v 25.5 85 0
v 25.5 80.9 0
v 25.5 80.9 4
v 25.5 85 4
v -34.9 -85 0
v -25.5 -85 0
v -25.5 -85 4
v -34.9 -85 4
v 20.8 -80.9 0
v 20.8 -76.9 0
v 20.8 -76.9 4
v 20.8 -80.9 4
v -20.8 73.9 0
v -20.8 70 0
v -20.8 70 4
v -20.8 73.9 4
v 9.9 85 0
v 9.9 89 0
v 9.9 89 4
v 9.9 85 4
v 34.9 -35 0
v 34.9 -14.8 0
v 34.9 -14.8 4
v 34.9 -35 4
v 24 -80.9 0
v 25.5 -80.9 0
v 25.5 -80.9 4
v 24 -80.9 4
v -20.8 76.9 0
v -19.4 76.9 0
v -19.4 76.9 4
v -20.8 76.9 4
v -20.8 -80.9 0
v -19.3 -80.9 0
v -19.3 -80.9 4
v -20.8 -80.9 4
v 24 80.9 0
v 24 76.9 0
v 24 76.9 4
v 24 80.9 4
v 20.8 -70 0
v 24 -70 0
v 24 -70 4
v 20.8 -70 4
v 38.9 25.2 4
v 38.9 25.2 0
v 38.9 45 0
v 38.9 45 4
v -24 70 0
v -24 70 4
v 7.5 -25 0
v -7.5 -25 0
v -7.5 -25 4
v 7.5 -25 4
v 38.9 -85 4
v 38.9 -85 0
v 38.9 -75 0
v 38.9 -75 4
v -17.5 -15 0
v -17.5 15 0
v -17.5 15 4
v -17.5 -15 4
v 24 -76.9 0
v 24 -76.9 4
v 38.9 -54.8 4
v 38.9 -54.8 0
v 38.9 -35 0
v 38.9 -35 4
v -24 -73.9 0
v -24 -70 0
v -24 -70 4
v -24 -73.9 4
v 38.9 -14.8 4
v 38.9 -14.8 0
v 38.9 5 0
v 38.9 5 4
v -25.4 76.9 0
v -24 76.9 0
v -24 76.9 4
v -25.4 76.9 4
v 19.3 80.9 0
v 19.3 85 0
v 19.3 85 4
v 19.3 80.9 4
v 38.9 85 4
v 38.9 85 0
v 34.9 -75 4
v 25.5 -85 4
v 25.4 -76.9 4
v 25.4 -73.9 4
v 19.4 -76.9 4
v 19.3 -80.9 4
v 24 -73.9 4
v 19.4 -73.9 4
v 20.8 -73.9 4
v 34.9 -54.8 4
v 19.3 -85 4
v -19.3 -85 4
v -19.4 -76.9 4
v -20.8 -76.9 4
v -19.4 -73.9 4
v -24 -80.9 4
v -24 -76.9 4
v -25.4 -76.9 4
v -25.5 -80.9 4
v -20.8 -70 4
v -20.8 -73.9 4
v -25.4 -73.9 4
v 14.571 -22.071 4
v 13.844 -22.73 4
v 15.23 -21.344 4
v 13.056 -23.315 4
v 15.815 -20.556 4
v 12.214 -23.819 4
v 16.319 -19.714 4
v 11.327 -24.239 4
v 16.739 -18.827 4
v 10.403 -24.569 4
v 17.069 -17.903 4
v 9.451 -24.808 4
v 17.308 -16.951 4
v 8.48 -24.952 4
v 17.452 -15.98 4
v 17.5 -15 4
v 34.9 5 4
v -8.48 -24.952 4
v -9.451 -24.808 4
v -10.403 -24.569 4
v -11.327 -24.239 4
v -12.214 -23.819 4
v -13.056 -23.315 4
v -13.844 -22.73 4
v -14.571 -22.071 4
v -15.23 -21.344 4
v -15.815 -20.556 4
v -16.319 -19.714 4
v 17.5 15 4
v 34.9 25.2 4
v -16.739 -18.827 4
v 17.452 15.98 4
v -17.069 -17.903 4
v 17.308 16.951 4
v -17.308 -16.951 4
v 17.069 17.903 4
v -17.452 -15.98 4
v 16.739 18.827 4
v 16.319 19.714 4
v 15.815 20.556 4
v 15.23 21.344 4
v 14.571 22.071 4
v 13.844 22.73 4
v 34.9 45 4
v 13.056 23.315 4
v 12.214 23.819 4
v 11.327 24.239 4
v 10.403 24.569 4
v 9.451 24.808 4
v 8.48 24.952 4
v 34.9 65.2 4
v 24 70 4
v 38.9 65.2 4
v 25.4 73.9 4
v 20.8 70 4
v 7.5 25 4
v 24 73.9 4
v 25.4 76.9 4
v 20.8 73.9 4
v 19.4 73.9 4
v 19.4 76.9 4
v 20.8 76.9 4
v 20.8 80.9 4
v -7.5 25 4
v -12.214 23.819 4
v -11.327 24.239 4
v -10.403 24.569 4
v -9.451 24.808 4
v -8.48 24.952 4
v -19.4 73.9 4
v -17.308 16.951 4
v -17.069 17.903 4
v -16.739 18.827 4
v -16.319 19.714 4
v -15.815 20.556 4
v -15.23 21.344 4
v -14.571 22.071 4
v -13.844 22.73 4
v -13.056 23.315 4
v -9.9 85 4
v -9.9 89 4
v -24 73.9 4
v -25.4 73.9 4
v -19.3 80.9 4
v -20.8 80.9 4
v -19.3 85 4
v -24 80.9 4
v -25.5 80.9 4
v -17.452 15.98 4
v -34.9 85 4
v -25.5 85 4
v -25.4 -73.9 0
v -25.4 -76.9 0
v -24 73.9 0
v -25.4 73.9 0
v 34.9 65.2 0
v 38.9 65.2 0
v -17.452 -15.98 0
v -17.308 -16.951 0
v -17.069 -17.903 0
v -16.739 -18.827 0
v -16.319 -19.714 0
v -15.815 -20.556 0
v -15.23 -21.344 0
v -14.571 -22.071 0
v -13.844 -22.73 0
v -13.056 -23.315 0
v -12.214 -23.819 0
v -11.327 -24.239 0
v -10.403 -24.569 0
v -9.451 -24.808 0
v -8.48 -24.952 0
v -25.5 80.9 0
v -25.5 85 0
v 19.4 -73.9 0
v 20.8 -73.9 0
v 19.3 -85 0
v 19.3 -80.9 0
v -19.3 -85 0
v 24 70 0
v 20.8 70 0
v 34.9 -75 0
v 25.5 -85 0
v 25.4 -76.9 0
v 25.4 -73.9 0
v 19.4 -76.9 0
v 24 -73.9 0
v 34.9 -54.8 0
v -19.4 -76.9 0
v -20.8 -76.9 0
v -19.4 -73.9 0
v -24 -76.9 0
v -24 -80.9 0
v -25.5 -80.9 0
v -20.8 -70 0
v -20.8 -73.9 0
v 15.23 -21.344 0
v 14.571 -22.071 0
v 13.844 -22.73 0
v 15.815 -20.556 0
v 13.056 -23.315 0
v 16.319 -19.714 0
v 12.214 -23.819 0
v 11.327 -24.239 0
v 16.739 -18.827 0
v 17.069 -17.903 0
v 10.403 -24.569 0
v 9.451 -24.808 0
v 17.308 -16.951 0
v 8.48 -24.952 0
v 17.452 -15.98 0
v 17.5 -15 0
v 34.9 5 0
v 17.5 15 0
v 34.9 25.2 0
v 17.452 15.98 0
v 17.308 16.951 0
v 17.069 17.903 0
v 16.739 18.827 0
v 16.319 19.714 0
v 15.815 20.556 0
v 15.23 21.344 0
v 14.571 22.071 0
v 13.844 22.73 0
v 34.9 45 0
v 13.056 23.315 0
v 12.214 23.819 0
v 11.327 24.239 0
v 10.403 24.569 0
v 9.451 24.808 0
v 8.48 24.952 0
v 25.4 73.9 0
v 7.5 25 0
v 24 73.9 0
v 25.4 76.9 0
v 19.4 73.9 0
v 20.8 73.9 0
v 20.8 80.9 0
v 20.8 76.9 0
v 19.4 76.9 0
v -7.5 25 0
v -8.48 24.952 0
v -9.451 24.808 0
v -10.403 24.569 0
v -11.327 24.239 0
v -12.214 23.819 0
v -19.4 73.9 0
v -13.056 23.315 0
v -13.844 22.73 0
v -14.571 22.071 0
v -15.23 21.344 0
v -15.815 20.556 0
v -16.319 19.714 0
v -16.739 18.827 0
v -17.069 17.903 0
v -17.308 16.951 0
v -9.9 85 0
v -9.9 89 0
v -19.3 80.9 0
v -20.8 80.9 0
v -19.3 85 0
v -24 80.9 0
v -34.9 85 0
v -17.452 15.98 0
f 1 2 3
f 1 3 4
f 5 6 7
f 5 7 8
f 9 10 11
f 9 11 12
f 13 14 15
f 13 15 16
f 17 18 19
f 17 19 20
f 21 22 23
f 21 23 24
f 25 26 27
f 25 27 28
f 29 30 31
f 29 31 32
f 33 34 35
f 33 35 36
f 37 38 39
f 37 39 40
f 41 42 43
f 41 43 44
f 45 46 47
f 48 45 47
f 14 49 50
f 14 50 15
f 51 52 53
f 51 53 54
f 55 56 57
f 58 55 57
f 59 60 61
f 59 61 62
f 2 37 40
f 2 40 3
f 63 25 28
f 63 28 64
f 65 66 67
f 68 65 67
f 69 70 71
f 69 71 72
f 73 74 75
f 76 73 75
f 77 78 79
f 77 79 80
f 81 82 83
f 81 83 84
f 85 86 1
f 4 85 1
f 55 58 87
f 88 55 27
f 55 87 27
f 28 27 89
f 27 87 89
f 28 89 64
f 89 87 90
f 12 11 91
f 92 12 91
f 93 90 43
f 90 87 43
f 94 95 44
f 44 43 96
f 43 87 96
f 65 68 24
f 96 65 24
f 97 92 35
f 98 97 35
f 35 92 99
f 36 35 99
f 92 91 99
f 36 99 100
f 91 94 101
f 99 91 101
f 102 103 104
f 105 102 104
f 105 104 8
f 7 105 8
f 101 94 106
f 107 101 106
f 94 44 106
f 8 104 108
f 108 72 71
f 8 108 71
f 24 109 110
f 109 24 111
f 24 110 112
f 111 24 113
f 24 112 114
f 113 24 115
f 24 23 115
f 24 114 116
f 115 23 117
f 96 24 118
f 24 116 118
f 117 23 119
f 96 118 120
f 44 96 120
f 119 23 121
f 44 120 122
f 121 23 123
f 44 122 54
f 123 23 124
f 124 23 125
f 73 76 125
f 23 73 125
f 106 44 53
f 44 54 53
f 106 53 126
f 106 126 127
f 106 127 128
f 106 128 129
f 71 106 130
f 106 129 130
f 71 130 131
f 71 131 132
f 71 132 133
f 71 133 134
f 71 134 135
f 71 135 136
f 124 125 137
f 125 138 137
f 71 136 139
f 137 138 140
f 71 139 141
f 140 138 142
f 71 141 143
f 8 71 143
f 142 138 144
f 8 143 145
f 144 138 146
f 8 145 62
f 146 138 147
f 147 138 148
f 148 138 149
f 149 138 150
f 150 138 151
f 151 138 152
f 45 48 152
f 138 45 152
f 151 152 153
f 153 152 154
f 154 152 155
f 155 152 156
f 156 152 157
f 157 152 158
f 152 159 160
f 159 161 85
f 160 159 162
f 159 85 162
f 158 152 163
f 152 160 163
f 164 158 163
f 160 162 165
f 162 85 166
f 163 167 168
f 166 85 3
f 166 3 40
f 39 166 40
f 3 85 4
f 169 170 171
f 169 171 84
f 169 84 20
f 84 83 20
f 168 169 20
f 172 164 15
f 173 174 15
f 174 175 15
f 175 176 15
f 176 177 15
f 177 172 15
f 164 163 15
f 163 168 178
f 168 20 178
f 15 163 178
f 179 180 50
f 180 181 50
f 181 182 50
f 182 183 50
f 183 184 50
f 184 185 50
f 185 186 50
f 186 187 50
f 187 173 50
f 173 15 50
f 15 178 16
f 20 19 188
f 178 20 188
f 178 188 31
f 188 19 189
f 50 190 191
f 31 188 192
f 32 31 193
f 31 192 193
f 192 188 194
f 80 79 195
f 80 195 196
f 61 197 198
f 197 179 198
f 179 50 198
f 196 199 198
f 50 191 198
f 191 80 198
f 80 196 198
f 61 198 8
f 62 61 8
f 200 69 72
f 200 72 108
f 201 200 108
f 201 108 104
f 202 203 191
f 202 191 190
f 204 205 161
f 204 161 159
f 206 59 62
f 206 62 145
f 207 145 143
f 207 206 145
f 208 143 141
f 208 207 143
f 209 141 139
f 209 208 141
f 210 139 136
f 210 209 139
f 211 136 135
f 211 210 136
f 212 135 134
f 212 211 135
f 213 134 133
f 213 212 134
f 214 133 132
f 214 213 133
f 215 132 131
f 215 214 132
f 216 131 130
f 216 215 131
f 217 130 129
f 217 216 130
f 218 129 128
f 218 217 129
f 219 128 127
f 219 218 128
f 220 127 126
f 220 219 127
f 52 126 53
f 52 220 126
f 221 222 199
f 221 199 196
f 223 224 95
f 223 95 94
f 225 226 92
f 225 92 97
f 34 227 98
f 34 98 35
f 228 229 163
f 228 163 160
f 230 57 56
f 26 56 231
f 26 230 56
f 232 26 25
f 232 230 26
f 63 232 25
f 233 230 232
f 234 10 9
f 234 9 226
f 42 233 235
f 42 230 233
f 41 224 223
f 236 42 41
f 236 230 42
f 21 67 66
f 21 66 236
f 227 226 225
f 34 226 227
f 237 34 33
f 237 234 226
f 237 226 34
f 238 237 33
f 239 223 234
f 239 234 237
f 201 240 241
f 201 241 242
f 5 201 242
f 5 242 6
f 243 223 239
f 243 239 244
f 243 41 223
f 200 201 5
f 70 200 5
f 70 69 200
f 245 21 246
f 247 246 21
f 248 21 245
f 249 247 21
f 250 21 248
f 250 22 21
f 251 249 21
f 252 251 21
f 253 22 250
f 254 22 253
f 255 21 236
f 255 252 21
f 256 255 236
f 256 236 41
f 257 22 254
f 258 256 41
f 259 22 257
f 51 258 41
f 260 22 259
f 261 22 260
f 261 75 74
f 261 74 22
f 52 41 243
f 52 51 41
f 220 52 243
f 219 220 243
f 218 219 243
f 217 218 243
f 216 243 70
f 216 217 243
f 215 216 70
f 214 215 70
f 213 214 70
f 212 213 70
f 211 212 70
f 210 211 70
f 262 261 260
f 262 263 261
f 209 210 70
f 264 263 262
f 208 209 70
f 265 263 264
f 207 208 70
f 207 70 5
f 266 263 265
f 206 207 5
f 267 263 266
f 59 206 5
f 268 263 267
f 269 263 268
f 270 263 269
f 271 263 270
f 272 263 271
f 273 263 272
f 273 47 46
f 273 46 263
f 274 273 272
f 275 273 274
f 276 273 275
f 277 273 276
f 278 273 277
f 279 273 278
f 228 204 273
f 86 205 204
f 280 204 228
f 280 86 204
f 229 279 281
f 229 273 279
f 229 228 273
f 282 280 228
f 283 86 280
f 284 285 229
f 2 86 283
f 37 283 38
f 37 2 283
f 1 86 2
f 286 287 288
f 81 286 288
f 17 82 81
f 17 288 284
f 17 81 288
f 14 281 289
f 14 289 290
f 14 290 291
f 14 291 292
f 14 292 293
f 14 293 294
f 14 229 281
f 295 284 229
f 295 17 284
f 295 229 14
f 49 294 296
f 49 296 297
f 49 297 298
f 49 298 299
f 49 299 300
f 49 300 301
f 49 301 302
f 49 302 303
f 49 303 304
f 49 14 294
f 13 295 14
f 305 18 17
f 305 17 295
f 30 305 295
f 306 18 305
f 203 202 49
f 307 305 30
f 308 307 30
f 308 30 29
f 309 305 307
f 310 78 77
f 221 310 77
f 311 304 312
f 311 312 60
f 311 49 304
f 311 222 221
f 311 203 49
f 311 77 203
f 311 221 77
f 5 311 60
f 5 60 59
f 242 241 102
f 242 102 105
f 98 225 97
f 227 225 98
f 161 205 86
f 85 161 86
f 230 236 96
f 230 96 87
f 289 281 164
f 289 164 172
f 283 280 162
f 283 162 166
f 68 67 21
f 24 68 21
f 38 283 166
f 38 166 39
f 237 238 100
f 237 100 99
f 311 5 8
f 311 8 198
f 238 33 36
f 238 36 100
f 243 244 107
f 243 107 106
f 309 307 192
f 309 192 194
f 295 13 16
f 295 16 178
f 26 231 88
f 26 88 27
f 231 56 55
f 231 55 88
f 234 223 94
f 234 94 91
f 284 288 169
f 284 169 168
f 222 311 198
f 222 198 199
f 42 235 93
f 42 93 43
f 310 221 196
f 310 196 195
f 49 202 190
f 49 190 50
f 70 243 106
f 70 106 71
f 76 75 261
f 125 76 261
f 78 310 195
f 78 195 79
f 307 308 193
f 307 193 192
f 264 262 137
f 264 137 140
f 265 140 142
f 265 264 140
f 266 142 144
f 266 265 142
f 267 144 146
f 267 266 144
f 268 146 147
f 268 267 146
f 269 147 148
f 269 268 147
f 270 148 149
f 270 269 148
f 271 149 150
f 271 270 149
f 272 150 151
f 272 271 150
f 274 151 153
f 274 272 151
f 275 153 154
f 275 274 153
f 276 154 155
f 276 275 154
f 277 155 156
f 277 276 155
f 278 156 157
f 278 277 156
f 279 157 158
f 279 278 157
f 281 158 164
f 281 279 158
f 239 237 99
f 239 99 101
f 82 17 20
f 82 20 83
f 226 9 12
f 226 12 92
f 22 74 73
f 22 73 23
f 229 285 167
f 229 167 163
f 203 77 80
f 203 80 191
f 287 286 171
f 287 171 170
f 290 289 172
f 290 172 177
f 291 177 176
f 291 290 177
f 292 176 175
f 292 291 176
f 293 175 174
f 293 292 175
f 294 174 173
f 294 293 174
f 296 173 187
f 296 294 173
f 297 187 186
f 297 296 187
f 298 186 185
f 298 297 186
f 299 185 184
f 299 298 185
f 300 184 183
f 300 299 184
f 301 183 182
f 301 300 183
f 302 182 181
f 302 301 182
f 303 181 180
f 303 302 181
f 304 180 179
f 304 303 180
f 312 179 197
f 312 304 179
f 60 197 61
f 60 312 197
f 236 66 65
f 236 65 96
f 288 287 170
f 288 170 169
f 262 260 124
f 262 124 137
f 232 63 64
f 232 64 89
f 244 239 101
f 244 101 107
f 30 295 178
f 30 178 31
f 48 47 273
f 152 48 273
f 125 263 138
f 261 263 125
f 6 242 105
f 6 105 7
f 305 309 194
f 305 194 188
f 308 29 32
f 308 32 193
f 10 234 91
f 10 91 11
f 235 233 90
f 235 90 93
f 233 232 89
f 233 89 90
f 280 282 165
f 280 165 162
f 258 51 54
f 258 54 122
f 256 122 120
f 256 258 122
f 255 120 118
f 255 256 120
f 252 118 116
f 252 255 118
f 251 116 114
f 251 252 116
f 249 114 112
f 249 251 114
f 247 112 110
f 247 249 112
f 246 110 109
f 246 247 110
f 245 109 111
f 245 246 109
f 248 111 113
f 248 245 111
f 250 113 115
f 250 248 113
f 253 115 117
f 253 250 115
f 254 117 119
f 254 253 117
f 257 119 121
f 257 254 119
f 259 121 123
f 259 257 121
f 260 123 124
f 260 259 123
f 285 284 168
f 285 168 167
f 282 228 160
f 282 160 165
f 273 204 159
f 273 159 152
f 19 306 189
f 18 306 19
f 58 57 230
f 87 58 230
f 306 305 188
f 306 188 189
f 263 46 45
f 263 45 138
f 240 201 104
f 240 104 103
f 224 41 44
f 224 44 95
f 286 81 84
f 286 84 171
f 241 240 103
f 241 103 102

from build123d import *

# Parameters (mm, degrees)
BOSS_EXTRUDE1_DEPTH = 4
CUT_EXTRUDE1_DEPTH  = 96.681816454
SKETCH4_W           = 4
SKETCH4_H           = 19.8
BOSS_EXTRUDE2_DEPTH = 4
SKETCH5_W           = 4
SKETCH5_H           = 10
BOSS_EXTRUDE3_DEPTH = 4
CUT_EXTRUDE2_DEPTH  = 98.212190594


with BuildPart() as part:
    # Sketch1 → Boss-Extrude1 (new body)
    with BuildSketch(Plane.XY):
        Polygon((-9.9, 85), (-9.9, 89), (9.9, 89), (9.9, 85), (34.9, 85), (34.9, -85), (-34.9, -85), (-34.9, 85), align=None)
    extrude(amount=BOSS_EXTRUDE1_DEPTH)

    # Sketch3 → Cut-Extrude1 (cut, through all)
    with BuildSketch(Plane(origin=(0, 0, 0), x_dir=(-1, 0, 0), z_dir=(0, 0, -1))):
        Polygon((25.5, 85), (25.5, 80.9), (24, 80.9), (24, 76.9), (25.4, 76.9), (25.4, 73.9), (24, 73.9), (24, 70), (20.8, 70), (20.8, 73.9), (19.4, 73.9), (19.4, 76.9), (20.8, 76.9), (20.8, 80.9), (19.3, 80.9), (19.3, 85), align=None)
        Polygon((-19.3, 85), (-19.3, 80.9), (-20.8, 80.9), (-20.8, 76.9), (-19.4, 76.9), (-19.4, 73.9), (-20.8, 73.9), (-20.8, 70), (-24, 70), (-24, 73.9), (-25.4, 73.9), (-25.4, 76.9), (-24, 76.9), (-24, 80.9), (-25.5, 80.9), (-25.5, 85), align=None)
        Polygon((-25.5, -85), (-25.5, -80.9), (-24, -80.9), (-24, -76.9), (-25.4, -76.9), (-25.4, -73.9), (-24, -73.9), (-24, -70), (-20.8, -70), (-20.8, -73.9), (-19.4, -73.9), (-19.4, -76.9), (-20.8, -76.9), (-20.8, -80.9), (-19.3, -80.9), (-19.3, -85), align=None)
        Polygon((19.3, -85), (19.3, -80.9), (20.8, -80.9), (20.8, -76.9), (19.4, -76.9), (19.4, -73.9), (20.8, -73.9), (20.8, -70), (24, -70), (24, -73.9), (25.4, -73.9), (25.4, -76.9), (24, -76.9), (24, -80.9), (25.5, -80.9), (25.5, -85), align=None)
    extrude(amount=-CUT_EXTRUDE1_DEPTH, mode=Mode.SUBTRACT)

    # Sketch4 → Boss-Extrude2 (add)
    with BuildSketch(Plane(origin=(0, 0, 0), x_dir=(-1, 0, 0), z_dir=(0, 0, -1))):
        with Locations((-36.9, 35.1)):
            Rectangle(SKETCH4_W, SKETCH4_H)
        with Locations((-36.9, 75.1)):
            Rectangle(SKETCH4_W, SKETCH4_H)
        with Locations((-36.9, -4.9)):
            Rectangle(SKETCH4_W, SKETCH4_H)
        with Locations((-36.9, -44.9)):
            Rectangle(SKETCH4_W, SKETCH4_H)
    extrude(amount=-BOSS_EXTRUDE2_DEPTH)

    # Sketch5 → Boss-Extrude3 (add)
    with BuildSketch(Plane(origin=(0, 0, 0), x_dir=(-1, 0, 0), z_dir=(0, 0, -1))):
        with Locations((-36.9, -80)):
            Rectangle(SKETCH5_W, SKETCH5_H)
    extrude(amount=-BOSS_EXTRUDE3_DEPTH)

    # Sketch6 → Cut-Extrude2 (cut, through all)
    with BuildSketch(Plane(origin=(0, 0, 0), x_dir=(-1, 0, 0), z_dir=(0, 0, -1))):
        with BuildLine():
            Line((-7.5, 25), (7.5, 25))
            ThreePointArc((7.5, 25), (14.571067812, 22.071067812), (17.5, 15))
            Line((17.5, 15), (17.5, -15))
            ThreePointArc((17.5, -15), (14.571067812, -22.071067812), (7.5, -25))
            Line((7.5, -25), (-7.5, -25))
            ThreePointArc((-7.5, -25), (-14.571067812, -22.071067812), (-17.5, -15))
            Line((-17.5, -15), (-17.5, 15))
            ThreePointArc((-17.5, 15), (-14.571067812, 22.071067812), (-7.5, 25))
        make_face()
    extrude(amount=-CUT_EXTRUDE2_DEPTH, mode=Mode.SUBTRACT)


solid = part.part
